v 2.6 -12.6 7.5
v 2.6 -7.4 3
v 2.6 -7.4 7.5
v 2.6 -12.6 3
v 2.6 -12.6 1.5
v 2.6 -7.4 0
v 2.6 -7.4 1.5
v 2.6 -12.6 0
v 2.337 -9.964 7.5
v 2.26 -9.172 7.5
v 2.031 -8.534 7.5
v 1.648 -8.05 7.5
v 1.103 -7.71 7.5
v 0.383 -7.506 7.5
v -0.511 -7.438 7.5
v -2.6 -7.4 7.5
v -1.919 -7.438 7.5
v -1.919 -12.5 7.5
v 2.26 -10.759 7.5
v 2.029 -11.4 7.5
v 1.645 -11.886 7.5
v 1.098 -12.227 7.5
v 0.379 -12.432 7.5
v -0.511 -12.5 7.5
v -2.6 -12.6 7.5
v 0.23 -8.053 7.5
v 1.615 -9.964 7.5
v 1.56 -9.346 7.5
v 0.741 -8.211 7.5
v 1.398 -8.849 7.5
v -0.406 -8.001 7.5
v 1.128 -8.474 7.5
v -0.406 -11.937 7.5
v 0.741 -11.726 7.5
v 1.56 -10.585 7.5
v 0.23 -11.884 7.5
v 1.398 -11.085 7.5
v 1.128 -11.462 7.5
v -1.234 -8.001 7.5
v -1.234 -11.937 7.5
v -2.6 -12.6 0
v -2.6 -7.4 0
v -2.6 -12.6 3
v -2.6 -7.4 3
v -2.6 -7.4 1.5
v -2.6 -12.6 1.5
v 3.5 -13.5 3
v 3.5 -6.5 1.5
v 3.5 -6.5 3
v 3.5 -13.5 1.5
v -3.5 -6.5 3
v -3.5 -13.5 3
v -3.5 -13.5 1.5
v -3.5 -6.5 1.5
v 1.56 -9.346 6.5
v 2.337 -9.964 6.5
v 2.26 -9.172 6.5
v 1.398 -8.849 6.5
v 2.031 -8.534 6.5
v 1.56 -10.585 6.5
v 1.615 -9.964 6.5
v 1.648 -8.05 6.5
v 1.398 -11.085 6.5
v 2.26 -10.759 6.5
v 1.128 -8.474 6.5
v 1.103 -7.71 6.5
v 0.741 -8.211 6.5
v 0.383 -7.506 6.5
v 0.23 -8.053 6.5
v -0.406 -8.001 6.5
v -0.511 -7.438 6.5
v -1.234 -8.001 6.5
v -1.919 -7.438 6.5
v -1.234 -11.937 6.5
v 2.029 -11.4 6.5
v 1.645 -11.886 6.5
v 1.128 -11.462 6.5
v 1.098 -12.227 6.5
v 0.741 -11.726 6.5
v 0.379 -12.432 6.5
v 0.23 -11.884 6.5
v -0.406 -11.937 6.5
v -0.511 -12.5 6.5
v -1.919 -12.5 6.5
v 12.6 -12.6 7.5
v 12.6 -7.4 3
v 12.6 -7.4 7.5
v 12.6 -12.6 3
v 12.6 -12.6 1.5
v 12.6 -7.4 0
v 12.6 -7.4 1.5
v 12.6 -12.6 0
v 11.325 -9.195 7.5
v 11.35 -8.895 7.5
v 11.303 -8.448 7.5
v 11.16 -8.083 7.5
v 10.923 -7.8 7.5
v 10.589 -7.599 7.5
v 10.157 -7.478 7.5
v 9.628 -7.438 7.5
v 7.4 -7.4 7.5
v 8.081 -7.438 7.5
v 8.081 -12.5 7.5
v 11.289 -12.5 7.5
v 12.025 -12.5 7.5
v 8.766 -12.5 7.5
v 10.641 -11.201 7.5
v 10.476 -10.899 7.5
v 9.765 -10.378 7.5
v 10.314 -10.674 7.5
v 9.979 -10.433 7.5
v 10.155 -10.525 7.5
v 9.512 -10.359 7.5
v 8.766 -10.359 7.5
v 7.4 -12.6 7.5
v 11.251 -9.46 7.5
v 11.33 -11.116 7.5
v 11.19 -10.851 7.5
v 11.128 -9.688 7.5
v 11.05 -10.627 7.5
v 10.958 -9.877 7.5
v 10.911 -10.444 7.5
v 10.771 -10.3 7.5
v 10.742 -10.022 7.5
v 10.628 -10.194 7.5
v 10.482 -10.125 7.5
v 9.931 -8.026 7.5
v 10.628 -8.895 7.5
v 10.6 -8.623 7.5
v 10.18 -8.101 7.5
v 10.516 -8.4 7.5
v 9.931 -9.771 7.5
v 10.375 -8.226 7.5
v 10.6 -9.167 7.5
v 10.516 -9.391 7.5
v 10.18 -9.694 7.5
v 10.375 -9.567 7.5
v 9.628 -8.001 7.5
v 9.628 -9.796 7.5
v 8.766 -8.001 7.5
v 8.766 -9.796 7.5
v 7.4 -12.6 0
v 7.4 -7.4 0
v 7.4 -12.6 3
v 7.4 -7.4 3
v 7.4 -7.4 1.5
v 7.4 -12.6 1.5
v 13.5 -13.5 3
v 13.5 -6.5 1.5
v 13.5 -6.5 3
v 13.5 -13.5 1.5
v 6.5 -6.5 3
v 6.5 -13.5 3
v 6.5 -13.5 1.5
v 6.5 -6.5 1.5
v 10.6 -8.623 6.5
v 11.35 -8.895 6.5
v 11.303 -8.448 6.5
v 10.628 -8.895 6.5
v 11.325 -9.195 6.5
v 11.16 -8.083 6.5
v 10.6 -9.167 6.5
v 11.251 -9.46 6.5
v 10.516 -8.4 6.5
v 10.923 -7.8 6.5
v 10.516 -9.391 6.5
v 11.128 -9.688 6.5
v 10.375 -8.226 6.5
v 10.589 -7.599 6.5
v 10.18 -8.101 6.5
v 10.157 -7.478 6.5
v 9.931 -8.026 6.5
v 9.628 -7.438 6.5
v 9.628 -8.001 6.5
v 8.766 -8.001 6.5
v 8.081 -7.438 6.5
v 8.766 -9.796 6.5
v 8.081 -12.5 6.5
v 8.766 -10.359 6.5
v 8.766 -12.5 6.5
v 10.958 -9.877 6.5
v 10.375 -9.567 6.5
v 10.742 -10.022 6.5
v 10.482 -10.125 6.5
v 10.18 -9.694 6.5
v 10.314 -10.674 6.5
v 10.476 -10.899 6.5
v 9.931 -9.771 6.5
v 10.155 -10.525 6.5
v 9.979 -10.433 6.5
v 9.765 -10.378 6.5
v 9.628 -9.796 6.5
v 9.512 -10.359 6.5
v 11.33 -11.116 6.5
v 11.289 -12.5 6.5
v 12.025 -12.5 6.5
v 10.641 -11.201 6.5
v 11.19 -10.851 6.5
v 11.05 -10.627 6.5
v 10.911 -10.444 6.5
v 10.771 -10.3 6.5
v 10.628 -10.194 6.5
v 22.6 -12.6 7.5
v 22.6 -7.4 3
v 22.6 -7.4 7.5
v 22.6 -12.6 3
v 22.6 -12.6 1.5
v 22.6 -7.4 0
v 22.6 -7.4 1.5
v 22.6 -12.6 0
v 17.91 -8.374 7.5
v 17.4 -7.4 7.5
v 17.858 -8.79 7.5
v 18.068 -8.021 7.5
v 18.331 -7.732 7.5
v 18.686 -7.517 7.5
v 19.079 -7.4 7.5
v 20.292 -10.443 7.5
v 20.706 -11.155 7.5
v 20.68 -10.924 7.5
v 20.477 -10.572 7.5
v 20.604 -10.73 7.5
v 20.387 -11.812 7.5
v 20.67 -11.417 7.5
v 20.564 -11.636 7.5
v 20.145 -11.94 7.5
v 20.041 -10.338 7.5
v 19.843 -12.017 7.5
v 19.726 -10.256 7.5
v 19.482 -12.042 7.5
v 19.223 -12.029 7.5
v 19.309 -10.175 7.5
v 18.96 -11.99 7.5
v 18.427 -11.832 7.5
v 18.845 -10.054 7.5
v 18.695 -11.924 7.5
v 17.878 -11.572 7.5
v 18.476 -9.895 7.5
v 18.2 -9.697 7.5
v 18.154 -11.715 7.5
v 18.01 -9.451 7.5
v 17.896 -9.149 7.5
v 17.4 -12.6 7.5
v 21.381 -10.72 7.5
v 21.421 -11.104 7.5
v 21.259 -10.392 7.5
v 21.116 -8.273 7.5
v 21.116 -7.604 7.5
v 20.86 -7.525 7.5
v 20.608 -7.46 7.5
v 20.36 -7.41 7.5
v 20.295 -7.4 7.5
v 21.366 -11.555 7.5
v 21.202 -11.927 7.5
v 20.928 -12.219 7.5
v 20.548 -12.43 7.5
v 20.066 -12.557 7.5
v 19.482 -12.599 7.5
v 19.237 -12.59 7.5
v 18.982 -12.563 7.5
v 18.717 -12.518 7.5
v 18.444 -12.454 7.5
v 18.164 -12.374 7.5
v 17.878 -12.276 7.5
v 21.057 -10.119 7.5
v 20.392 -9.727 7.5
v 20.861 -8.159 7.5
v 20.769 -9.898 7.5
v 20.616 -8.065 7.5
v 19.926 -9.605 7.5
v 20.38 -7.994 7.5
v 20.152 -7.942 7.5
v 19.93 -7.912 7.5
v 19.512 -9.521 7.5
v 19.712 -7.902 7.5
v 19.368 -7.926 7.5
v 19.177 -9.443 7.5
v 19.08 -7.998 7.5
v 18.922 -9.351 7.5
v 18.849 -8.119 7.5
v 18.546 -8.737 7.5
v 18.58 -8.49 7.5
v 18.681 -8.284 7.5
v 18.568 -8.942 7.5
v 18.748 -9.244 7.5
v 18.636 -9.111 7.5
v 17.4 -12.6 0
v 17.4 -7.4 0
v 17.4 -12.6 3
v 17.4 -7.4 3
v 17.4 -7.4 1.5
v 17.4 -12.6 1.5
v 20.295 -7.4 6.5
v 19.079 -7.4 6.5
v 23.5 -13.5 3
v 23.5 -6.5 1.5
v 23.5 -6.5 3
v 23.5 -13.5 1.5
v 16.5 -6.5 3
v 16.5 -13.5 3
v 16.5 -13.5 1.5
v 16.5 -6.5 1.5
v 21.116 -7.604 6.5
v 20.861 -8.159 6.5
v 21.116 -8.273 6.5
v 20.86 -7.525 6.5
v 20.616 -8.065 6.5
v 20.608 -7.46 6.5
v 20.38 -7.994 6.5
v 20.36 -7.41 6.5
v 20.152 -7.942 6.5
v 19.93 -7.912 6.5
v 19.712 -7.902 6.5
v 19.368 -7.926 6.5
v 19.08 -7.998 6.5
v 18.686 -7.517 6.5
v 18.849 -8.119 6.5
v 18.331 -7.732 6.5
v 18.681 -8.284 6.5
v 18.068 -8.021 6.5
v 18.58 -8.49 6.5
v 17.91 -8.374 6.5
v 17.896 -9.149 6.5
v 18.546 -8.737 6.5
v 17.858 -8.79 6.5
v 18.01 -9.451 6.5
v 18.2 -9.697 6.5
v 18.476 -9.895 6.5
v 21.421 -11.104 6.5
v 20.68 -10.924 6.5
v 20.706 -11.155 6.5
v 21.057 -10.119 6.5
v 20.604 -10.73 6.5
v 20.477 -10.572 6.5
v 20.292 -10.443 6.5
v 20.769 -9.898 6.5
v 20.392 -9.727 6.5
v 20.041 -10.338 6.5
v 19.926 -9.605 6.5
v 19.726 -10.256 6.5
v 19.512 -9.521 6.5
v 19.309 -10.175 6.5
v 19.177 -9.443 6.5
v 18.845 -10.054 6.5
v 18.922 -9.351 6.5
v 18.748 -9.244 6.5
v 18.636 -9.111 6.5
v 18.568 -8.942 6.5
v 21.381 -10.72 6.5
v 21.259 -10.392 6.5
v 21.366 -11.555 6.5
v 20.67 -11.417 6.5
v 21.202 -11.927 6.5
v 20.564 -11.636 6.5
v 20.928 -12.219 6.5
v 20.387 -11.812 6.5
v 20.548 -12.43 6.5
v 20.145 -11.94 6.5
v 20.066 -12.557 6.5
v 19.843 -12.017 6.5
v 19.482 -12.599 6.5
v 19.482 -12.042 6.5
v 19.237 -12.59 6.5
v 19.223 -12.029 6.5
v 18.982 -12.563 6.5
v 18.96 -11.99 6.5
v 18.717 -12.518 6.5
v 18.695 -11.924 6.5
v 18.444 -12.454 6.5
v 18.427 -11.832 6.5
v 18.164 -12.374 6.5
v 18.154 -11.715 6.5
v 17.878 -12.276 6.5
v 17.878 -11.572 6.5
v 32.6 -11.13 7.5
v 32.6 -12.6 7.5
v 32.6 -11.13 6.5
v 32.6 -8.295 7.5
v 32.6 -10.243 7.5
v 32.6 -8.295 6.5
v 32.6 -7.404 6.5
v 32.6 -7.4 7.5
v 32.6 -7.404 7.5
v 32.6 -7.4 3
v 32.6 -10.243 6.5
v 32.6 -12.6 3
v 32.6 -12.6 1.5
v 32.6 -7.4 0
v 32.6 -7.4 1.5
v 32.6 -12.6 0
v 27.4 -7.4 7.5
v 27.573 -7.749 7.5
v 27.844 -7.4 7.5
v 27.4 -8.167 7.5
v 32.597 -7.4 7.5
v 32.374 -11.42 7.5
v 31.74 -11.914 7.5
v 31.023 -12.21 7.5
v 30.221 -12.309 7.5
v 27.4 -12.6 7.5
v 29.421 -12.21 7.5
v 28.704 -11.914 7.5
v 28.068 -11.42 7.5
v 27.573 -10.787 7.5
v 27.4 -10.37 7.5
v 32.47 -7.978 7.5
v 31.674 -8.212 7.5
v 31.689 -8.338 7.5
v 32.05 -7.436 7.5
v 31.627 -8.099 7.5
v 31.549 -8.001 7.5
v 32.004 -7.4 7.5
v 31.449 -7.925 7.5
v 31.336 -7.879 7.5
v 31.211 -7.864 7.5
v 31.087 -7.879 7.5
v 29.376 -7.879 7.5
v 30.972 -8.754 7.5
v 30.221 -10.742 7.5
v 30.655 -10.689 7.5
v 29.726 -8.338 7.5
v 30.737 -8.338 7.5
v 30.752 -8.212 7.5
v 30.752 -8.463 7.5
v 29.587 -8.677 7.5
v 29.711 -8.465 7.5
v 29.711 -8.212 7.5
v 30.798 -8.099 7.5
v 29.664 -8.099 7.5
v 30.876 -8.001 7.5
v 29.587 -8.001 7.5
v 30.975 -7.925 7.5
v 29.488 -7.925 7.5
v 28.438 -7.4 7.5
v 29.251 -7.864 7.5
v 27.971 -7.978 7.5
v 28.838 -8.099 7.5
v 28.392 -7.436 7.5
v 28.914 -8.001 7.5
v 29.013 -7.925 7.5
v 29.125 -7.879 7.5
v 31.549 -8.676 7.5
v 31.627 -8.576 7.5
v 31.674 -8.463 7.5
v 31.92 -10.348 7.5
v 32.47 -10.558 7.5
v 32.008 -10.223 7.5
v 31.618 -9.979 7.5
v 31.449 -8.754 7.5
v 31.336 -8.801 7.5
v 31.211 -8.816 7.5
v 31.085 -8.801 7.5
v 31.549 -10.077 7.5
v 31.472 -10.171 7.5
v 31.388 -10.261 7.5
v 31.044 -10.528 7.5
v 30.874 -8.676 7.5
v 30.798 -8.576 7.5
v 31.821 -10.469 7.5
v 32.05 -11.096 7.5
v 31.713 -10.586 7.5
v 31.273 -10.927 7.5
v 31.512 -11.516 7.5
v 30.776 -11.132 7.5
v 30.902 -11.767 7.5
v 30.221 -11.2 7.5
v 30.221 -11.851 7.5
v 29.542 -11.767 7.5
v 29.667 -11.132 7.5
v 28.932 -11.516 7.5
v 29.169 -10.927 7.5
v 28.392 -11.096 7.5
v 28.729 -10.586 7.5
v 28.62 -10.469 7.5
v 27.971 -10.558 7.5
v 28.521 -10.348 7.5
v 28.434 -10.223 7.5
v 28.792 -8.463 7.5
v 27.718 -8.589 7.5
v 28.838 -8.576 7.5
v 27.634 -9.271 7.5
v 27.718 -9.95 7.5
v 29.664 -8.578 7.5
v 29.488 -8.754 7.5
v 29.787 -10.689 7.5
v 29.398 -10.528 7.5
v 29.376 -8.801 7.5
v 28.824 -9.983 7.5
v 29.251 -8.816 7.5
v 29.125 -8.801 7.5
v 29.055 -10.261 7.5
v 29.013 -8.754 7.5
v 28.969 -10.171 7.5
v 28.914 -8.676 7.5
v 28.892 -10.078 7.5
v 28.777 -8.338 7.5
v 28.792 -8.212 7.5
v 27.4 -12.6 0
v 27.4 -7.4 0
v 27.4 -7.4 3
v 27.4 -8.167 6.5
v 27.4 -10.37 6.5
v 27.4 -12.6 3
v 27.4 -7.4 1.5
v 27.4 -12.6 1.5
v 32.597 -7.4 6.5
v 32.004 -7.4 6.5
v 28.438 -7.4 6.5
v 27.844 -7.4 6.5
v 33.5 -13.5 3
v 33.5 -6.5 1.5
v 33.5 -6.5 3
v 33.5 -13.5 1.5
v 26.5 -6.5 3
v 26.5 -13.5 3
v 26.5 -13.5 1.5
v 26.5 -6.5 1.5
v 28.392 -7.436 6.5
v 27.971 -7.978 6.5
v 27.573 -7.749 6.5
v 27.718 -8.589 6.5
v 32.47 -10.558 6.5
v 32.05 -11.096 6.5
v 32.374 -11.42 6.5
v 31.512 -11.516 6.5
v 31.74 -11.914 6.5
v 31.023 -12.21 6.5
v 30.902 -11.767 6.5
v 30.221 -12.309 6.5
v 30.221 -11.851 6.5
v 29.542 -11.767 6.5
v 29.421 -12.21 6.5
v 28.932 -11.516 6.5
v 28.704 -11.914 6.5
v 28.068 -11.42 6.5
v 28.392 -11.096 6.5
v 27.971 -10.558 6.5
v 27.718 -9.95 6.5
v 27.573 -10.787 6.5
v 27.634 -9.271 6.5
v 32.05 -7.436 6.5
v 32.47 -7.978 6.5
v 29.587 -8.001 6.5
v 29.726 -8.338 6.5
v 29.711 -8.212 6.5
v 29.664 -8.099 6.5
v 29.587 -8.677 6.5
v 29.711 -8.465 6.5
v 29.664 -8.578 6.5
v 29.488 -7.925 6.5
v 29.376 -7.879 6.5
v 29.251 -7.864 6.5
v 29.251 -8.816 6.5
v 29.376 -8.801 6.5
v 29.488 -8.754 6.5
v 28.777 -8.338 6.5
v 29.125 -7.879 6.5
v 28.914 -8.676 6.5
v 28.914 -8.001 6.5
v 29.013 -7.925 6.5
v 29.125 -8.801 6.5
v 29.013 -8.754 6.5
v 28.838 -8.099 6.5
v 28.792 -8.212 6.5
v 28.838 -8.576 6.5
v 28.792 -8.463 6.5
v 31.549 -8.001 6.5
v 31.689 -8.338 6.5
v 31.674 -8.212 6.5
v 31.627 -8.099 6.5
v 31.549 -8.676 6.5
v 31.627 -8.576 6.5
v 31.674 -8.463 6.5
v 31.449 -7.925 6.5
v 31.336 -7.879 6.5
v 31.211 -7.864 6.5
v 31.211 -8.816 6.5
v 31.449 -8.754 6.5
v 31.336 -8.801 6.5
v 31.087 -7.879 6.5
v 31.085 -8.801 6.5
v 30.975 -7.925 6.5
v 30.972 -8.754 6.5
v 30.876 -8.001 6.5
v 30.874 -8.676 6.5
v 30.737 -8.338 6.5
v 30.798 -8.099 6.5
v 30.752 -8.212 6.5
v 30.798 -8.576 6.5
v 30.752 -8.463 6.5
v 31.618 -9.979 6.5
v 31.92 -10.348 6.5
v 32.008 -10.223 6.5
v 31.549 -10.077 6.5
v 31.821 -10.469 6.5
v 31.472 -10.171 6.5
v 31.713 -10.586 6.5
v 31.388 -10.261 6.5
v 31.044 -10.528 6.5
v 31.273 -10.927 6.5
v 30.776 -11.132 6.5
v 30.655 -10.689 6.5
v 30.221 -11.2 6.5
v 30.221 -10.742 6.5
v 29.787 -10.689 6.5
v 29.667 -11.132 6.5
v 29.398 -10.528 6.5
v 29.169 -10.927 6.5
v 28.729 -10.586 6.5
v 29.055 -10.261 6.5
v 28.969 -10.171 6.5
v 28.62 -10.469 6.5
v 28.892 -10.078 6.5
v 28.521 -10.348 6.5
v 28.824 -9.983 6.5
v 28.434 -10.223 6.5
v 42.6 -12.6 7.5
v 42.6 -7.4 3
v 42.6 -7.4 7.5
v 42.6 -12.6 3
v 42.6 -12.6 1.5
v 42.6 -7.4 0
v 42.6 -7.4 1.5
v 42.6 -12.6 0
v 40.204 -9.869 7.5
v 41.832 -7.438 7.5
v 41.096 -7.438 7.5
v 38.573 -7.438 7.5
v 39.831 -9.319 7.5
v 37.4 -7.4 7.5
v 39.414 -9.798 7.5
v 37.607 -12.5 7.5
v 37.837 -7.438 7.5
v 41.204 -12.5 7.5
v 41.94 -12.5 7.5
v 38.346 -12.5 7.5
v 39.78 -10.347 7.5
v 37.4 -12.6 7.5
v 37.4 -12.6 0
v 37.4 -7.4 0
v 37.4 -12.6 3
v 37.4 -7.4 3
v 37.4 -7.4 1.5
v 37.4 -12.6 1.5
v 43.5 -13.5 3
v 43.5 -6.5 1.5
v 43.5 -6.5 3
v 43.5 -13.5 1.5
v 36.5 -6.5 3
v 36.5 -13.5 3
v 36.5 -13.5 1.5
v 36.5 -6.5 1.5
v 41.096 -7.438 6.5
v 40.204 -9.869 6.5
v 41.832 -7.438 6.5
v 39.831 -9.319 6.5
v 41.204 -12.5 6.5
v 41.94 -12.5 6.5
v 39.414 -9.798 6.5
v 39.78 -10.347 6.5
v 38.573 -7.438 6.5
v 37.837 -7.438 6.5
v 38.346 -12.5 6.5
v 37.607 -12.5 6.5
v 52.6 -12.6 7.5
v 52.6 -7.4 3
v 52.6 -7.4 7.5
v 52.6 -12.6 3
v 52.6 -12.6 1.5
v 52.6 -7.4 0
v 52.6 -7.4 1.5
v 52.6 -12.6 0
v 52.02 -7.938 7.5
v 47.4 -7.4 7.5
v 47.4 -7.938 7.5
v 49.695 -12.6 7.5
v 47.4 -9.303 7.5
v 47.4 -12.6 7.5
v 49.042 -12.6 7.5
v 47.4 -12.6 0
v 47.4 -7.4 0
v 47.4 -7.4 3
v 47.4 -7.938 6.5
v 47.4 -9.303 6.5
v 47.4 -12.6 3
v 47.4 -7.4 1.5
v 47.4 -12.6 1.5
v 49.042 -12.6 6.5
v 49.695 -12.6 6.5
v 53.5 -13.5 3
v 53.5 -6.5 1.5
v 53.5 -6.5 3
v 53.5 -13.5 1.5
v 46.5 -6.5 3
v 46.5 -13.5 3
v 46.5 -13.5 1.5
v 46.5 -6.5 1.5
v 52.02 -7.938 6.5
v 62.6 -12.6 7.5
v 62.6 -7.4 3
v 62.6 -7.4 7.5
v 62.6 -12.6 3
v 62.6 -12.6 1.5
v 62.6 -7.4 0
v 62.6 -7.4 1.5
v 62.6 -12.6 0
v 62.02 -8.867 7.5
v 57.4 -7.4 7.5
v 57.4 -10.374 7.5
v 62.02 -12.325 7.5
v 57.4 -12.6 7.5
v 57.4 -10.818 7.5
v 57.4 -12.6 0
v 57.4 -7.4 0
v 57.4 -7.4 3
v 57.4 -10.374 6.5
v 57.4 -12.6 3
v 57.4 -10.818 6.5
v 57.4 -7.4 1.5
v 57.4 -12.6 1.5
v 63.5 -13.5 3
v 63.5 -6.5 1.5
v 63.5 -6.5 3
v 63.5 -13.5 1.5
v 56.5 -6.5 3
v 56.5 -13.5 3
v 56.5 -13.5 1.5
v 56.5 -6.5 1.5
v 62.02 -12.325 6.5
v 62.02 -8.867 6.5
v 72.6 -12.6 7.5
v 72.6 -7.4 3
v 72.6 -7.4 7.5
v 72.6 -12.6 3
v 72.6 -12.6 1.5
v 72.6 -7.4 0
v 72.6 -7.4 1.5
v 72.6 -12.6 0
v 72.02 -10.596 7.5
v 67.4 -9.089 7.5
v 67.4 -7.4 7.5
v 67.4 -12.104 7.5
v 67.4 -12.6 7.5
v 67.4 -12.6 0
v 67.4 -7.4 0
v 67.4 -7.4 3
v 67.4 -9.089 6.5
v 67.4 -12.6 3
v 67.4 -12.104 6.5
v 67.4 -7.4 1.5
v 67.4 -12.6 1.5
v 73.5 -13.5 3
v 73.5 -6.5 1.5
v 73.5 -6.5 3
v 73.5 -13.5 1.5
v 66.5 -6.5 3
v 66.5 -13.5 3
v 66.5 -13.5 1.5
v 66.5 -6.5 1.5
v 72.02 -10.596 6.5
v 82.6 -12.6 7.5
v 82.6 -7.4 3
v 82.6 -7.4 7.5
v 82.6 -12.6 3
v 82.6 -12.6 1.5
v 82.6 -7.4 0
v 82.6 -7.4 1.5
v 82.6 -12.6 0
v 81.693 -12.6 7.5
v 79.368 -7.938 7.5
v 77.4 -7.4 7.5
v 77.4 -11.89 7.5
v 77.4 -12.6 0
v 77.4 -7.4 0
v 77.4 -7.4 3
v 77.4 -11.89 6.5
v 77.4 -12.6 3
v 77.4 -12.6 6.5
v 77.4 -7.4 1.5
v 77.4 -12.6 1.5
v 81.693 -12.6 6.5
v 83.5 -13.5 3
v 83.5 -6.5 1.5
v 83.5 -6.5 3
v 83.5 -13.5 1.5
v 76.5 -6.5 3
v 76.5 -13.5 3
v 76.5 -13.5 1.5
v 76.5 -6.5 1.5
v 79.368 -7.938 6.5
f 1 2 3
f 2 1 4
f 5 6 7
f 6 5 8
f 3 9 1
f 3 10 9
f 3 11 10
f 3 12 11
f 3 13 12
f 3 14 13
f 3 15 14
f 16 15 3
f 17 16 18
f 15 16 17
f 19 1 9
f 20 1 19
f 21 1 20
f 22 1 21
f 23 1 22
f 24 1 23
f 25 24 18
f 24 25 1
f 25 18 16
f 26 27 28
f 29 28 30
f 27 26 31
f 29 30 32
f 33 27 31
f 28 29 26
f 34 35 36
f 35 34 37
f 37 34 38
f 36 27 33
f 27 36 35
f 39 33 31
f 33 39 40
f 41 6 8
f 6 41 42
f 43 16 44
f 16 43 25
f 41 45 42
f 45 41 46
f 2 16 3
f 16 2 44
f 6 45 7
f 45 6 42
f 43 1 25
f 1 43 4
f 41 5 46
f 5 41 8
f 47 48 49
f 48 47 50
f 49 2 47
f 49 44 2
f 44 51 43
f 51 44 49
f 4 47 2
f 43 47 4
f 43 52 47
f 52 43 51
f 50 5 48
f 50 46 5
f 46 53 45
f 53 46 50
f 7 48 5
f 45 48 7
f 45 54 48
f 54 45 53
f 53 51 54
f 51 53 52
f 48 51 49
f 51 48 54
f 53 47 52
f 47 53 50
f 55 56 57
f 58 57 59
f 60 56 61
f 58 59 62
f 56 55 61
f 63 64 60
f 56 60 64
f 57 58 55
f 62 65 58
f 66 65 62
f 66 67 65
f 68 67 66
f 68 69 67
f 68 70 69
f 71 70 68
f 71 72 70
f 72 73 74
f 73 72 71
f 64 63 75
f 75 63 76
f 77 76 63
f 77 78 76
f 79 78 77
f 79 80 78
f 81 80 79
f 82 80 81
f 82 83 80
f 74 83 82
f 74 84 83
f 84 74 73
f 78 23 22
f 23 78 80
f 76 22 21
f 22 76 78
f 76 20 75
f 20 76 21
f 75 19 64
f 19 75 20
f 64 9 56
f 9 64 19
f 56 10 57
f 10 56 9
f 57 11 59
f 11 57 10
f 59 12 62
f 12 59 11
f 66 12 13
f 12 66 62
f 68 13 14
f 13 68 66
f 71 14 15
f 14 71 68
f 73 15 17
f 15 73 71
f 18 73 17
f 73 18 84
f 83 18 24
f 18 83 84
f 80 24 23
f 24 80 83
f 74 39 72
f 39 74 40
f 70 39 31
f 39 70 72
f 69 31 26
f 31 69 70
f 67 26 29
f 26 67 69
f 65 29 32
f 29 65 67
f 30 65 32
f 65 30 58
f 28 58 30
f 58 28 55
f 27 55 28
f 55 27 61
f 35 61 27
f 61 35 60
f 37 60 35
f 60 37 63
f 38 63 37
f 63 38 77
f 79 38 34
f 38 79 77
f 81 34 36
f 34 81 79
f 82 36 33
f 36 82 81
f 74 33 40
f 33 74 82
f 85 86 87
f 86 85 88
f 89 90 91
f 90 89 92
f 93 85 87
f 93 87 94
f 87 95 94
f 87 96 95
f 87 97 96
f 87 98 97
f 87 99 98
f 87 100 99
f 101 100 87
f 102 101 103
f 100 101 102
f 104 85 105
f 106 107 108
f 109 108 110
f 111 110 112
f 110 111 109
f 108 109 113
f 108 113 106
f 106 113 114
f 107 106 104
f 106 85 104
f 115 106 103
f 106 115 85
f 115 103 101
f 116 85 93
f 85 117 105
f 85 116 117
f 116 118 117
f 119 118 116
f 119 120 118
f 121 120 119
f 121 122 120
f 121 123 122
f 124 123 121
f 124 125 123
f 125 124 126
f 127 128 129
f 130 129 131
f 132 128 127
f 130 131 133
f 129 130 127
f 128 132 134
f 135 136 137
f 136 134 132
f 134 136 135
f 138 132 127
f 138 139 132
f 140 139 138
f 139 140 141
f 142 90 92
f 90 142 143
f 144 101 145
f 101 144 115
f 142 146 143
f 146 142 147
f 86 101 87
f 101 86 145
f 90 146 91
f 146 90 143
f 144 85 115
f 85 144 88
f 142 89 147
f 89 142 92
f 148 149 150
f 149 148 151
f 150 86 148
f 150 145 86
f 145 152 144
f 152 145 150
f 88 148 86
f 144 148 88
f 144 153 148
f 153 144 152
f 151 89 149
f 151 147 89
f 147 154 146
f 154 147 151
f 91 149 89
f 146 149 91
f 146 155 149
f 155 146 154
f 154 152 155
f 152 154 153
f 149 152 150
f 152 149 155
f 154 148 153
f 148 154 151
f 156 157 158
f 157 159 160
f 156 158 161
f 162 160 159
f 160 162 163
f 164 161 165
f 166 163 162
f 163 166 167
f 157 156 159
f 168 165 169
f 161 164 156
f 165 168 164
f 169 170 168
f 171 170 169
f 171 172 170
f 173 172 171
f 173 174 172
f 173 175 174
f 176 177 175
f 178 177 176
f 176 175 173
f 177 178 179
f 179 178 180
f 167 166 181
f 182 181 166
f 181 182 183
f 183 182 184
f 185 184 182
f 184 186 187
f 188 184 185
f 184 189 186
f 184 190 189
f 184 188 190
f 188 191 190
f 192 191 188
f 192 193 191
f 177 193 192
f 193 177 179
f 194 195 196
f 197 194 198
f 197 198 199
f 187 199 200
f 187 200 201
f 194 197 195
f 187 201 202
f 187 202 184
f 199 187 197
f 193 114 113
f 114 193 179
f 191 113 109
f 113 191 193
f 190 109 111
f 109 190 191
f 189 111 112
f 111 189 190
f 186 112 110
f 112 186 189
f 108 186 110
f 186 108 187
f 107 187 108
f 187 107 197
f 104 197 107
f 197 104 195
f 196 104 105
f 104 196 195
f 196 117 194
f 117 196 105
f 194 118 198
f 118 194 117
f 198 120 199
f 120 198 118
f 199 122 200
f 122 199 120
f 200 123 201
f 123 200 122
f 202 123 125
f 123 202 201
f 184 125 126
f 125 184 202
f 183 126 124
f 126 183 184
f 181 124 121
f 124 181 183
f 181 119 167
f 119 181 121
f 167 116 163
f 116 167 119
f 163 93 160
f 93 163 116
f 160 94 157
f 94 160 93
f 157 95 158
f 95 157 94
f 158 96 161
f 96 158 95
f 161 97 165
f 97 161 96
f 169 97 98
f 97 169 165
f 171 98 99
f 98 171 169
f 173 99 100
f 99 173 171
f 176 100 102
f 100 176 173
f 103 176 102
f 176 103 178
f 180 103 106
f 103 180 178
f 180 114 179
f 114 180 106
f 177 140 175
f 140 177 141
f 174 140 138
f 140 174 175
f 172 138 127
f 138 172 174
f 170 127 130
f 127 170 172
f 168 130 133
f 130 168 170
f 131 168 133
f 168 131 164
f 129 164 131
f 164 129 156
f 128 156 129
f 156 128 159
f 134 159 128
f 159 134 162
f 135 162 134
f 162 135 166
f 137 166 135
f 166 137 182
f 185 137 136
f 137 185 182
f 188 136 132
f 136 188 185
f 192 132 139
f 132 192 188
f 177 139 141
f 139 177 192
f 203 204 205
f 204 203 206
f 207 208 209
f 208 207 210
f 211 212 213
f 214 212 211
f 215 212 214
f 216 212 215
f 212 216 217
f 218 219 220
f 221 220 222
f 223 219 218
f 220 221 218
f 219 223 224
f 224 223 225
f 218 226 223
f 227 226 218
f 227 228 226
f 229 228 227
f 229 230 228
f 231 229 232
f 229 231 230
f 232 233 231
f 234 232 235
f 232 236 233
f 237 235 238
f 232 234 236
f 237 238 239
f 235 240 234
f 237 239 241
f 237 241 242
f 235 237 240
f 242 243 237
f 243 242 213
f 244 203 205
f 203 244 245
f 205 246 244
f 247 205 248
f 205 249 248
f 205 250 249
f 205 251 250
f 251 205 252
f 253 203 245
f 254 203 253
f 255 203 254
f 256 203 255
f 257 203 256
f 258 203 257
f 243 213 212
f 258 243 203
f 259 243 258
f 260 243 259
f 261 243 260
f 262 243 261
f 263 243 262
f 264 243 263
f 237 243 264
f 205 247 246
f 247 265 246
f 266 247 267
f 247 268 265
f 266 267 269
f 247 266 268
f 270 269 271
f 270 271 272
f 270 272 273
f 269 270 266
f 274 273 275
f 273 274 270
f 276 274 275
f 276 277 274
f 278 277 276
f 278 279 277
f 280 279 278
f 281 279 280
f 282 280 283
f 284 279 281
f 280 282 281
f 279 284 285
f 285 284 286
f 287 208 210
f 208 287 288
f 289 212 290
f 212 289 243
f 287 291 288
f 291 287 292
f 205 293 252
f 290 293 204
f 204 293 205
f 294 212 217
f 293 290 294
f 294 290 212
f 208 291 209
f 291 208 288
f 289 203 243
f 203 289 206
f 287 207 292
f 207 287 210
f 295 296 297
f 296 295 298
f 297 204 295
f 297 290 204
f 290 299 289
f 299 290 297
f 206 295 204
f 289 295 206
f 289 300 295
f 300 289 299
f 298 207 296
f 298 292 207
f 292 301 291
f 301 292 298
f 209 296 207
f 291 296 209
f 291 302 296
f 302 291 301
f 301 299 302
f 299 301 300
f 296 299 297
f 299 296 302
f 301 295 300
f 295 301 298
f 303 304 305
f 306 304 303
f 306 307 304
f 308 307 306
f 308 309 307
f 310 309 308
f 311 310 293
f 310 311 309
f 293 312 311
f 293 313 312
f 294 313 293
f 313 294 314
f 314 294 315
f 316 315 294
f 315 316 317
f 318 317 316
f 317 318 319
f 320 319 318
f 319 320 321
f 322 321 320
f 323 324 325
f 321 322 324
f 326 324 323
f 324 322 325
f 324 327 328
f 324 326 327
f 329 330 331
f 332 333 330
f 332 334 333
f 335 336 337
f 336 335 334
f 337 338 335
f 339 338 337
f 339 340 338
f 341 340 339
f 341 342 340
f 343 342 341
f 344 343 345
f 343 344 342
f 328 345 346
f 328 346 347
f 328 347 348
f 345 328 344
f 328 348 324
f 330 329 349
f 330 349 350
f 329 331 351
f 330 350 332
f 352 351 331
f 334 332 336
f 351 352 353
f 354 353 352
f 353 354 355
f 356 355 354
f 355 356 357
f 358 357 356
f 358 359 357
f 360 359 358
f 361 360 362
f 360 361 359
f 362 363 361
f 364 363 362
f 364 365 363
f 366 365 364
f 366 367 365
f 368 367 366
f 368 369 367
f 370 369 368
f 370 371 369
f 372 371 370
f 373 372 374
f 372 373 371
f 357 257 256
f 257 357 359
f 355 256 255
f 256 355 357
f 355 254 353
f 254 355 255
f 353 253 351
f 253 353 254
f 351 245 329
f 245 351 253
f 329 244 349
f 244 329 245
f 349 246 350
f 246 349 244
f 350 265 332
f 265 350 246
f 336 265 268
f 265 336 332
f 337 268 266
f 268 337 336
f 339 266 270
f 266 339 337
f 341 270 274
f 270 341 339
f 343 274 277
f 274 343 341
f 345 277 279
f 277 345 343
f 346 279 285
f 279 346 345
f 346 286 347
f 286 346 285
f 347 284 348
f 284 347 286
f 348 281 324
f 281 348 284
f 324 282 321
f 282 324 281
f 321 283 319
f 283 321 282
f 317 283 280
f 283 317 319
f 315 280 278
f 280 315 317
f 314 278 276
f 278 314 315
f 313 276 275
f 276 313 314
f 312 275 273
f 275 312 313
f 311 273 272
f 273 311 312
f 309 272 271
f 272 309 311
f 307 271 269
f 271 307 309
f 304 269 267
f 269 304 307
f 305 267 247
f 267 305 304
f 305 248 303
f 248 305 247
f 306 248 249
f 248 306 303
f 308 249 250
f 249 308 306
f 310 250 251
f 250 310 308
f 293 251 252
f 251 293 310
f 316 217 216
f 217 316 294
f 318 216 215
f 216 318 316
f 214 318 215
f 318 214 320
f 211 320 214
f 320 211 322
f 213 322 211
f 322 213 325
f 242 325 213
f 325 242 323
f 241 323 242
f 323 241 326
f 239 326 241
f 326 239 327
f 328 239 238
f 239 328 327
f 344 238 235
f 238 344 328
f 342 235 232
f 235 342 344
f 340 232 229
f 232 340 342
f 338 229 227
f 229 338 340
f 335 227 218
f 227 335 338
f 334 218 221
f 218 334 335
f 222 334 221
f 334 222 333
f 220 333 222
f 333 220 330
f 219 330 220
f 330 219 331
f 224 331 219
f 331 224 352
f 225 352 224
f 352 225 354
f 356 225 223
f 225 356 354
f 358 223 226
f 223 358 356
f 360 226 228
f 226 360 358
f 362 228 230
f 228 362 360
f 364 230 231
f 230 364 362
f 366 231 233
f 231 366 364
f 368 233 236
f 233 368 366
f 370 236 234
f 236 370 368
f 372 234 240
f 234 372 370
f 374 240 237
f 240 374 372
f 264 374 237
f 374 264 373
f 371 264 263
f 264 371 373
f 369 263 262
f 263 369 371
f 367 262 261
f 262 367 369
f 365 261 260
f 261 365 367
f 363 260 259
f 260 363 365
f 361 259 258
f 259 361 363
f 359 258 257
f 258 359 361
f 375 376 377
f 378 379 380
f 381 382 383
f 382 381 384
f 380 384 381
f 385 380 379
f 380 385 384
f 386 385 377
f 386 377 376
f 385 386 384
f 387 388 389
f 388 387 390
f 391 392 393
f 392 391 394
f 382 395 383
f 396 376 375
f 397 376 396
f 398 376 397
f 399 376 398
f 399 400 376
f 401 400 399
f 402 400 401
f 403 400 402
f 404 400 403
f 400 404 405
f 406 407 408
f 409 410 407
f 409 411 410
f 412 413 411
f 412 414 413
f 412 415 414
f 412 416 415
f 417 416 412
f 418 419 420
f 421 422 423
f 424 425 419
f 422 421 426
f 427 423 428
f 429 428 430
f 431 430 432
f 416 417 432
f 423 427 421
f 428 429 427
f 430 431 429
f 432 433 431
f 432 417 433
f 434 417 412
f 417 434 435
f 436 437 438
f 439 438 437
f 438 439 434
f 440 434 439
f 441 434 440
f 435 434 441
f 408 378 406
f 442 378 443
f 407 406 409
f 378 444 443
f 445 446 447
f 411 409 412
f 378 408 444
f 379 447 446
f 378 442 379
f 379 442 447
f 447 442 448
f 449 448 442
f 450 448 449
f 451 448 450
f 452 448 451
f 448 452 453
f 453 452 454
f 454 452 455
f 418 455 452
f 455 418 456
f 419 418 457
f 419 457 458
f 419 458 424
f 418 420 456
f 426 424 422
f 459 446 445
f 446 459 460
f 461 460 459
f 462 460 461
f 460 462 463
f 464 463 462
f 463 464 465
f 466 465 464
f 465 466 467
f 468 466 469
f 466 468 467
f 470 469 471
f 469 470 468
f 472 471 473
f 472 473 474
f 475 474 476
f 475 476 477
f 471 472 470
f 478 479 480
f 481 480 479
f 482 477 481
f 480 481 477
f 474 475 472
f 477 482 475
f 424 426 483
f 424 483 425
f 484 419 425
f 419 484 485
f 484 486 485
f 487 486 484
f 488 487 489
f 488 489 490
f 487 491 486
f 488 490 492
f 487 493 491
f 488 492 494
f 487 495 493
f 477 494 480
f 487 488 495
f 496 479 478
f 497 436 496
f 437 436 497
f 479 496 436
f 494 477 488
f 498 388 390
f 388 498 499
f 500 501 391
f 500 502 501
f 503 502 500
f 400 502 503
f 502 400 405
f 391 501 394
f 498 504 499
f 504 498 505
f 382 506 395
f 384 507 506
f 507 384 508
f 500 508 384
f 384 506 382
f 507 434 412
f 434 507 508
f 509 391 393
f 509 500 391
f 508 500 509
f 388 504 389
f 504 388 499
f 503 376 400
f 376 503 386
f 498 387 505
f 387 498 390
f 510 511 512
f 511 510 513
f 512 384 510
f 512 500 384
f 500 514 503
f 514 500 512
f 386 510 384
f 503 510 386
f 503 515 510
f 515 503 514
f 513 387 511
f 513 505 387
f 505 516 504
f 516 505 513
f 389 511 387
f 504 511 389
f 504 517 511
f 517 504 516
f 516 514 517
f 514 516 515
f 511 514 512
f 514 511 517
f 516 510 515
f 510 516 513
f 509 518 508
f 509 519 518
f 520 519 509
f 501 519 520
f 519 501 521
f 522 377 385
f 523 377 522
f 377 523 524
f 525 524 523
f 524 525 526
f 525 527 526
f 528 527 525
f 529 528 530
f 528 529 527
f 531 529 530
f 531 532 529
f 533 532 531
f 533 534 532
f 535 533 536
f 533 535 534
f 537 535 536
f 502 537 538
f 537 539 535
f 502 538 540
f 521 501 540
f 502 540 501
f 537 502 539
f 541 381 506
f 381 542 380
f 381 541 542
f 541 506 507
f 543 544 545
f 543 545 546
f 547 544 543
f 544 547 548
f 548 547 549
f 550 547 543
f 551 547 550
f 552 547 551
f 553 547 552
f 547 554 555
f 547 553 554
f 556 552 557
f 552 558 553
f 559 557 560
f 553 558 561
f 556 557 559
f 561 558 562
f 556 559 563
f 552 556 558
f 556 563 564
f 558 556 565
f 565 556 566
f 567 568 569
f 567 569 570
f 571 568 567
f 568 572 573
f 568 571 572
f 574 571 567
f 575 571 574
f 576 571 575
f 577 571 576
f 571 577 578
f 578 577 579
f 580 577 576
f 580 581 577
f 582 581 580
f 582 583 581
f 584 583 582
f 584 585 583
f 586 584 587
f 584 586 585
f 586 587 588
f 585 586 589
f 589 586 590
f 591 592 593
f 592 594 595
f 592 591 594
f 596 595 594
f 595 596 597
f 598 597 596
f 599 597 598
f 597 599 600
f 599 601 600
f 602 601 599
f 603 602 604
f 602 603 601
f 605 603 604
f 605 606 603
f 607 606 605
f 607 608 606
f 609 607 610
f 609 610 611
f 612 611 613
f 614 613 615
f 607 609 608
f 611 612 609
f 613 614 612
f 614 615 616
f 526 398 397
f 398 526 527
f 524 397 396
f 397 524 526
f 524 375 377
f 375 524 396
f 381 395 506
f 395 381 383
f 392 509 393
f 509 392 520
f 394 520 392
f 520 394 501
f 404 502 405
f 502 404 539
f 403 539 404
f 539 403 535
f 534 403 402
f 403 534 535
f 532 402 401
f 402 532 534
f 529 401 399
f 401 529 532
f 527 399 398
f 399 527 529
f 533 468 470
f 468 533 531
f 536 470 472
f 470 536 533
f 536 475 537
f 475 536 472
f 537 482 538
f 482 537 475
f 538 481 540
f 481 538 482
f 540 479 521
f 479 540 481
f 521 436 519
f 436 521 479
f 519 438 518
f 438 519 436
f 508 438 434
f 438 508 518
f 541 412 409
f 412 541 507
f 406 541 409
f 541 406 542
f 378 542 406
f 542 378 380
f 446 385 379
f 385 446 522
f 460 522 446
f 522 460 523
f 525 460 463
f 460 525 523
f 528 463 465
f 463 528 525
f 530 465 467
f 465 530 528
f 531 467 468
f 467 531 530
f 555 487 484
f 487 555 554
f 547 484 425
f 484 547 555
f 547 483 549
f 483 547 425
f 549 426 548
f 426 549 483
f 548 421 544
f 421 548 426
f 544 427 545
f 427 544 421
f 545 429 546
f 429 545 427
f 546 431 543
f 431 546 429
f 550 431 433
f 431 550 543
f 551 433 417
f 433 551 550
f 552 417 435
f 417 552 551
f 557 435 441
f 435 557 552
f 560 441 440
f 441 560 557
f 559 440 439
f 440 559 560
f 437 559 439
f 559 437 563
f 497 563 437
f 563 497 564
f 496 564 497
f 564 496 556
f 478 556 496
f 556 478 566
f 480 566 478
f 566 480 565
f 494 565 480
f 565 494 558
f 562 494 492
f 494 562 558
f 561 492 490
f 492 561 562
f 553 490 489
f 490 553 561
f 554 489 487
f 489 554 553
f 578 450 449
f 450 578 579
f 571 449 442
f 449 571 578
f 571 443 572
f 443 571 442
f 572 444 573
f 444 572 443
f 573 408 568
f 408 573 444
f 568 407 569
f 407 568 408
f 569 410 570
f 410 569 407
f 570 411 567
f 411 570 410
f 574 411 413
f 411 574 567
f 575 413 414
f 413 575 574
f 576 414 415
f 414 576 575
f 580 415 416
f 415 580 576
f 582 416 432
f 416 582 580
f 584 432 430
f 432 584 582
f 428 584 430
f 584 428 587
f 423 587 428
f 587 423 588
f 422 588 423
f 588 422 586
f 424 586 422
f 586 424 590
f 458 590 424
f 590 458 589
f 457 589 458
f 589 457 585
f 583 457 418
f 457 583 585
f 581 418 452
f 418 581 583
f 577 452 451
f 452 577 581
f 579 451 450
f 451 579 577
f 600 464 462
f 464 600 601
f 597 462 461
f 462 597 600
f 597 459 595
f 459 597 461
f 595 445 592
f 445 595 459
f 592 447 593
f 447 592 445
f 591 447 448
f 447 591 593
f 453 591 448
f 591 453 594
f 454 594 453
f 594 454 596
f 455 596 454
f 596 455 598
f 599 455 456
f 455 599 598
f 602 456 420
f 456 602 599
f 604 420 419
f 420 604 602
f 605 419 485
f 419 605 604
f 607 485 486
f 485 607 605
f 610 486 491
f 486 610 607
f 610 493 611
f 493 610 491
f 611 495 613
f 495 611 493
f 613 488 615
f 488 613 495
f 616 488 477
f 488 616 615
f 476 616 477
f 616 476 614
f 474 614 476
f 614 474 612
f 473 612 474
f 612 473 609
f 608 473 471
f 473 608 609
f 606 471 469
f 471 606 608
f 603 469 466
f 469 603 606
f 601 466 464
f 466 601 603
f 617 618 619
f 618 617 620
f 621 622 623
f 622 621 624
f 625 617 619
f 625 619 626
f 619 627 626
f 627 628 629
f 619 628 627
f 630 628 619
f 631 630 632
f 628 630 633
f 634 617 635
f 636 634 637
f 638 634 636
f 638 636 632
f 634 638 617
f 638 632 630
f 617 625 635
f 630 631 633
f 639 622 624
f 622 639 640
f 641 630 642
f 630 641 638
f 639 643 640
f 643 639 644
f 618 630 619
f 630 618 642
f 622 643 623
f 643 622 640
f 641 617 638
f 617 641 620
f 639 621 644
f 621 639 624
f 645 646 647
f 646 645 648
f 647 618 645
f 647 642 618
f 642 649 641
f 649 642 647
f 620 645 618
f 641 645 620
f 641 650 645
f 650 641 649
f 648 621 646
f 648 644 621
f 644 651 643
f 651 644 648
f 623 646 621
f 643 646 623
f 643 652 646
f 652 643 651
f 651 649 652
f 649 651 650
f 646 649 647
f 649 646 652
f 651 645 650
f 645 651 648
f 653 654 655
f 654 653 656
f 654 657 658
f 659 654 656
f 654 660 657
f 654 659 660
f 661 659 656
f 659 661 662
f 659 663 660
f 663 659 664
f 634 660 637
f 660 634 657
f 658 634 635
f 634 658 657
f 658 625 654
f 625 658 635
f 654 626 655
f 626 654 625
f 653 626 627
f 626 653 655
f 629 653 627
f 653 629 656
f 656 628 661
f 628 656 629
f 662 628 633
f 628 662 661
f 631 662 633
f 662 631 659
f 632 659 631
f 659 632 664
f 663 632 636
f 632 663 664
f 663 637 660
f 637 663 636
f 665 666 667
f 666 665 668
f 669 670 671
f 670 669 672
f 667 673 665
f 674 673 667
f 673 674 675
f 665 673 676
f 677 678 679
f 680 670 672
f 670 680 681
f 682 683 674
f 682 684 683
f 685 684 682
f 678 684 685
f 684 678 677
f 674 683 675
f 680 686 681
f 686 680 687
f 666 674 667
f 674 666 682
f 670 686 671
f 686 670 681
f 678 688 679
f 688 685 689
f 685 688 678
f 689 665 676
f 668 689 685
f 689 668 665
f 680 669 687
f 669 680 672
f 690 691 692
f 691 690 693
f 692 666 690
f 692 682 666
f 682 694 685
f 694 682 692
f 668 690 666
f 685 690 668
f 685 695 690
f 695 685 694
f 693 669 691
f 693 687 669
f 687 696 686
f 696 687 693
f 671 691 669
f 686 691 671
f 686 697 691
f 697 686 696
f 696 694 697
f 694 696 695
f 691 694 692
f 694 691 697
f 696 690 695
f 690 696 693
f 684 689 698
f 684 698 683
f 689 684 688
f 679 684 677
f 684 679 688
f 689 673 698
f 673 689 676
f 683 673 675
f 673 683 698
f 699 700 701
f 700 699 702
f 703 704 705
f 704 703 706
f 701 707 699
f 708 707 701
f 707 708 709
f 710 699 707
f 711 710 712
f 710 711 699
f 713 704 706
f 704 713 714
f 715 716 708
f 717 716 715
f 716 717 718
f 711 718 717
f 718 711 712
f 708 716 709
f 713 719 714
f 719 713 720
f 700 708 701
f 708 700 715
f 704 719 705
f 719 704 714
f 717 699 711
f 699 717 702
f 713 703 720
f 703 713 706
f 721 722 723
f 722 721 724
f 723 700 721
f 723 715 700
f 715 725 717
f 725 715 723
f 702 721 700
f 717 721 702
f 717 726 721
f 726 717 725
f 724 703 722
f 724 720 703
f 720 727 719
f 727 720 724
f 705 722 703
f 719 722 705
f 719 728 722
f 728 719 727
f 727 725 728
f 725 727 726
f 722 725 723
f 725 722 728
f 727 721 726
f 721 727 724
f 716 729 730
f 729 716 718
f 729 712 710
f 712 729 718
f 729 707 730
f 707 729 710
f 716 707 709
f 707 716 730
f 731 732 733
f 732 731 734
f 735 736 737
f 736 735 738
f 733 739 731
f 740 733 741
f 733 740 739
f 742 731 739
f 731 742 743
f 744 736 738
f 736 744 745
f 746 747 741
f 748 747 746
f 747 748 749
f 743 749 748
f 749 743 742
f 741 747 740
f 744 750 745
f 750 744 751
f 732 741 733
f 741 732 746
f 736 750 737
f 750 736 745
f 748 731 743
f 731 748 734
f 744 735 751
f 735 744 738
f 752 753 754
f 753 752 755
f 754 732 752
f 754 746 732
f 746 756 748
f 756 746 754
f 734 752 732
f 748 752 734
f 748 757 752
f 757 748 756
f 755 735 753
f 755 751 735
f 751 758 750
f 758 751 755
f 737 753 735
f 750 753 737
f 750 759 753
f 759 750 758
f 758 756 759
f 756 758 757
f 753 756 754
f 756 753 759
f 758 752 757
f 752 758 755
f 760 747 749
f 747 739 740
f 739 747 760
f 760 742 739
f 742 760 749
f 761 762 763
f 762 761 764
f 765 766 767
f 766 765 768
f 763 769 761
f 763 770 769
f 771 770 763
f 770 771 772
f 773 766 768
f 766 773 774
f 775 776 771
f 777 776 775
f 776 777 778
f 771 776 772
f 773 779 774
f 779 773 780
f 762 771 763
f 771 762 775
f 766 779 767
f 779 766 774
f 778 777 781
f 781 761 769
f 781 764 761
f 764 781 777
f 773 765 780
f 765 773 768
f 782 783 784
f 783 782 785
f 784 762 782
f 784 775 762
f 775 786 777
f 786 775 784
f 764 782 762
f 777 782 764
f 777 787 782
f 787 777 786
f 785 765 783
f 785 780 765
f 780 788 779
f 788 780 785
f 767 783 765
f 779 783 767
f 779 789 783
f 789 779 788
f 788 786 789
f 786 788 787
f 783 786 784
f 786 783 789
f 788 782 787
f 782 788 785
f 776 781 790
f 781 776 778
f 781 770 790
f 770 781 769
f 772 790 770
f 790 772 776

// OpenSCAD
WallThickness = 1.5;
UnitLength = 70 + 2 * WallThickness + 1;
UnitWidth = 115;
UnitHeight = 30;

USBPowerHolePositionY = 10 + WallThickness + 12.5 + 4.5;
USBPowerHolePositionZ = 6.5;
USBPowerHoleSizeY = 10;
USBPowerHoleSizeZ = 4;

LCDSizeX=34; // unit width
LCDSizeY=34; // unit length
LCDPositionX=UnitWidth-LCDSizeX-17;
LCDPositionY=UnitLength-LCDSizeY-12;

ButtonSizeX = 6;
ButtonSizeY = 6;
ButtonDistanceX = 2.54;
ButtonDistanceY = 2.54;

ButtonDoorPositionX = 5+WallThickness+0.5+0.5;
ButtonDoorPositionY = 65+WallThickness-0.5-ButtonSizeY;

ButtonResetPositionX = ButtonDoorPositionX + ButtonDistanceX * 6;
ButtonResetPositionY = ButtonDoorPositionY;

ButtonSelectPositionX = ButtonDoorPositionX;
ButtonSelectPositionY = ButtonDoorPositionY - ButtonDistanceY * 4;

ButtonCancelPositionX = ButtonResetPositionX;
ButtonCancelPositionY = ButtonSelectPositionY;

ButtonConfirmPositionX = ButtonSelectPositionX + ButtonDistanceX * 3;
ButtonConfirmPositionY = ButtonSelectPositionY - ButtonDistanceY * 3;

ButtonDownPositionX = ButtonDoorPositionX;
ButtonDownPositionY = ButtonConfirmPositionY - ButtonDistanceY * 11;

ButtonLeftPositionX = ButtonConfirmPositionX;
ButtonLeftPositionY = ButtonDownPositionY + ButtonDistanceY * 3;

ButtonRightPositionX = ButtonConfirmPositionX;
ButtonRightPositionY = ButtonDownPositionY - ButtonDistanceY * 3;

ButtonUpPositionX = ButtonResetPositionX;
ButtonUpPositionY = ButtonDownPositionY;


// Shell
/*
difference() {

        difference() {
            cube([UnitWidth, UnitLength, UnitHeight], center=false);
                translate([WallThickness, WallThickness, -WallThickness]) {
                    cube([UnitWidth - 2*WallThickness, UnitLength -2*WallThickness, UnitHeight
], center=false);
            }

            translate([LCDPositionX,LCDPositionY,UnitHeight-WallThickness]) {
                cube([LCDSizeX, LCDSizeY, WallThickness], center=false);
            }

            translate([ButtonDoorPositionX,ButtonDoorPositionY,UnitHeight-WallThickness]) {
                cube([ButtonSizeX, ButtonSizeY, WallThickness], center=false);
            }

            translate([ButtonResetPositionX,ButtonResetPositionY,UnitHeight-WallThickness]) {
                cube([ButtonSizeX, ButtonSizeY, WallThickness], center=false);
            }

            translate([ButtonSelectPositionX,ButtonSelectPositionY,UnitHeight-WallThickness]) {
                cube([ButtonSizeX, ButtonSizeY, WallThickness], center=false);
            }

            translate([ButtonConfirmPositionX,ButtonConfirmPositionY,UnitHeight-WallThickness]) {
                cube([ButtonSizeX, ButtonSizeY, WallThickness], center=false);
            }

            translate([ButtonCancelPositionX,ButtonCancelPositionY,UnitHeight-WallThickness]) {
                cube([ButtonSizeX, ButtonSizeY, WallThickness], center=false);
            }

            translate([ButtonDownPositionX,ButtonDownPositionY,UnitHeight-WallThickness]) {
                cube([ButtonSizeX, ButtonSizeY, WallThickness], center=false);
            }

            translate([ButtonLeftPositionX,ButtonLeftPositionY,UnitHeight-WallThickness]) {
                cube([ButtonSizeX, ButtonSizeY, WallThickness], center=false);
            }

            translate([ButtonRightPositionX,ButtonRightPositionY,UnitHeight-WallThickness]) {
                cube([ButtonSizeX, ButtonSizeY, WallThickness], center=false);
            }

            translate([ButtonUpPositionX,ButtonUpPositionY,UnitHeight-WallThickness]) {
                cube([ButtonSizeX, ButtonSizeY, WallThickness], center=false);
            }

            translate([UnitWidth-WallThickness,UnitLength-USBPowerHoleSizeY-10,0]) {
                cube([WallThickness, USBPowerHoleSizeY, USBPowerHoleSizeZ], center=false);
            }

        }
}       


// Slope

difference() {
    translate([0, 0, -UnitHeight*2]) {
        cube([UnitWidth, UnitLength, UnitHeight*2], center=false);
    }

    translate([WallThickness, WallThickness, -UnitHeight*2]) {
        cube([UnitWidth - 2*WallThickness, UnitLength -2*WallThickness, UnitHeight*2
], center=false);
    }
    rotate([0,atan(UnitHeight*2/UnitWidth),0]) {
        translate([0,0,-UnitHeight*2]) {
            cube([sqrt(UnitWidth*UnitWidth+UnitHeight*UnitHeight*4),UnitLength,UnitHeight*2], center=false);
        }
    }
}
*/

// Text
/*
translate([UnitWidth-80, 0-1/2, 10]) {
    rotate([90, 0, 0]) {
        linear_extrude(height = 1/2){
            text("Math Exercise", size=6, font="Arial Black");
        }
    }
}
*/

// Buttons

// Button Door
translate([0, -10, WallThickness * 5/2]) {
    difference() {
        union() {
        cube([ButtonSizeX - 0.8, ButtonSizeY - 0.8, WallThickness * 5], center=true);
            translate([0, 0, -WallThickness]) {
                cube([ButtonSizeX + 1, ButtonSizeY + 1, WallThickness ], center=true);
            }
        }

        translate([-ButtonSizeX/3-0.6,-ButtonSizeY/3-0.5,WallThickness * 5/2-1]) {
            linear_extrude(height = 1){
            text("D", size=5, font="Arial Black");
            }
        }
    }
}

// Button Reset
translate([10, -10, WallThickness * 5/2]) {
    difference() {
        union() {
        cube([ButtonSizeX - 0.8, ButtonSizeY - 0.8, WallThickness * 5], center=true);
            translate([0, 0, -WallThickness]) {
                cube([ButtonSizeX + 1, ButtonSizeY + 1, WallThickness ], center=true);
            }
        }

        translate([-ButtonSizeX/3-0.6,-ButtonSizeY/3-0.5,WallThickness * 5/2-1]) {
            linear_extrude(height = 1){
            text("R", size=5, font="Arial Black");
            }
        }
    }
}

// Button Select
translate([20, -10, WallThickness * 5/2]) {
    difference() {
        union() {
        cube([ButtonSizeX - 0.8, ButtonSizeY - 0.8, WallThickness * 5], center=true);
            translate([0, 0, -WallThickness]) {
                cube([ButtonSizeX + 1, ButtonSizeY + 1, WallThickness ], center=true);
            }
        }

        translate([-ButtonSizeX/3-0.6,-ButtonSizeY/3-0.5,WallThickness * 5/2-1]) {
            linear_extrude(height = 1){
            text("S", size=5, font="Arial Black");
            }
        }
    }
}

// Button Confirm
translate([30, -10, WallThickness * 5/2]) {
    difference() {
        union() {
        cube([ButtonSizeX - 0.8, ButtonSizeY - 0.8, WallThickness * 5], center=true);
            translate([0, 0, -WallThickness]) {
                cube([ButtonSizeX + 1, ButtonSizeY + 1, WallThickness ], center=true);
            }
        }

        translate([-ButtonSizeX/3-1.4,-ButtonSizeY/3+0.2,WallThickness * 5/2-1]) {
            linear_extrude(height = 1){
            text("☺", size=5, font="Arial Black");
            }
        }
    }
}

// Button Cancel
translate([40, -10, WallThickness * 5/2]) {
    difference() {
        union() {
        cube([ButtonSizeX - 0.8, ButtonSizeY - 0.8, WallThickness * 5], center=true);
            translate([0, 0, -WallThickness]) {
                cube([ButtonSizeX + 1, ButtonSizeY + 1, WallThickness ], center=true);
            }
        }

        translate([-ButtonSizeX/3-0.6,-ButtonSizeY/3-0.5,WallThickness * 5/2-1]) {
            linear_extrude(height = 1){
            text("X", size=5, font="Arial Black");
            }
        }
    }
}

// Number Down
translate([50, -10, WallThickness * 5/2]) {
    difference() {
        union() {
        cube([ButtonSizeX - 0.8, ButtonSizeY - 0.8, WallThickness * 5], center=true);
            translate([0, 0, -WallThickness]) {
                cube([ButtonSizeX + 1, ButtonSizeY + 1, WallThickness ], center=true);
            }
        }

        translate([-ButtonSizeX/3-1.3,-ButtonSizeY/3-0.4,WallThickness * 5/2-1]) {
            linear_extrude(height = 1){
            text("▼", size=5, font="Arial Black");
            }
        }
    }
}

// Number Left
translate([60, -10, WallThickness * 5/2]) {
    difference() {
        union() {
        cube([ButtonSizeX - 0.8, ButtonSizeY - 0.8, WallThickness * 5], center=true);
            translate([0, 0, -WallThickness]) {
                cube([ButtonSizeX + 1, ButtonSizeY + 1, WallThickness ], center=true);
            }
        }

        translate([-ButtonSizeX/3-1.3,-ButtonSizeY/3-0.4,WallThickness * 5/2-1]) {
            linear_extrude(height = 1){
            text("◄", size=5, font="Arial Black");
            }
        }
    }
}

// Number Right
translate([70, -10, WallThickness * 5/2]) {
    difference() {
        union() {
        cube([ButtonSizeX - 0.8, ButtonSizeY - 0.8, WallThickness * 5], center=true);
            translate([0, 0, -WallThickness]) {
                cube([ButtonSizeX + 1, ButtonSizeY + 1, WallThickness ], center=true);
            }
        }

        translate([-ButtonSizeX/3-1.3,-ButtonSizeY/3-0.4,WallThickness * 5/2-1]) {
            linear_extrude(height = 1){
            text("►", size=5, font="Arial Black");
            }
        }
    }
}

// Number Up
translate([80, -10, WallThickness * 5/2]) {
    difference() {
        union() {
        cube([ButtonSizeX - 0.8, ButtonSizeY - 0.8, WallThickness * 5], center=true);
            translate([0, 0, -WallThickness]) {
                cube([ButtonSizeX + 1, ButtonSizeY + 1, WallThickness ], center=true);
            }
        }

        translate([-ButtonSizeX/3-1.3,-ButtonSizeY/3-0.4,WallThickness * 5/2-1]) {
            linear_extrude(height = 1){
            text("▲", size=5, font="Arial Black");
            }
        }
    }
}
